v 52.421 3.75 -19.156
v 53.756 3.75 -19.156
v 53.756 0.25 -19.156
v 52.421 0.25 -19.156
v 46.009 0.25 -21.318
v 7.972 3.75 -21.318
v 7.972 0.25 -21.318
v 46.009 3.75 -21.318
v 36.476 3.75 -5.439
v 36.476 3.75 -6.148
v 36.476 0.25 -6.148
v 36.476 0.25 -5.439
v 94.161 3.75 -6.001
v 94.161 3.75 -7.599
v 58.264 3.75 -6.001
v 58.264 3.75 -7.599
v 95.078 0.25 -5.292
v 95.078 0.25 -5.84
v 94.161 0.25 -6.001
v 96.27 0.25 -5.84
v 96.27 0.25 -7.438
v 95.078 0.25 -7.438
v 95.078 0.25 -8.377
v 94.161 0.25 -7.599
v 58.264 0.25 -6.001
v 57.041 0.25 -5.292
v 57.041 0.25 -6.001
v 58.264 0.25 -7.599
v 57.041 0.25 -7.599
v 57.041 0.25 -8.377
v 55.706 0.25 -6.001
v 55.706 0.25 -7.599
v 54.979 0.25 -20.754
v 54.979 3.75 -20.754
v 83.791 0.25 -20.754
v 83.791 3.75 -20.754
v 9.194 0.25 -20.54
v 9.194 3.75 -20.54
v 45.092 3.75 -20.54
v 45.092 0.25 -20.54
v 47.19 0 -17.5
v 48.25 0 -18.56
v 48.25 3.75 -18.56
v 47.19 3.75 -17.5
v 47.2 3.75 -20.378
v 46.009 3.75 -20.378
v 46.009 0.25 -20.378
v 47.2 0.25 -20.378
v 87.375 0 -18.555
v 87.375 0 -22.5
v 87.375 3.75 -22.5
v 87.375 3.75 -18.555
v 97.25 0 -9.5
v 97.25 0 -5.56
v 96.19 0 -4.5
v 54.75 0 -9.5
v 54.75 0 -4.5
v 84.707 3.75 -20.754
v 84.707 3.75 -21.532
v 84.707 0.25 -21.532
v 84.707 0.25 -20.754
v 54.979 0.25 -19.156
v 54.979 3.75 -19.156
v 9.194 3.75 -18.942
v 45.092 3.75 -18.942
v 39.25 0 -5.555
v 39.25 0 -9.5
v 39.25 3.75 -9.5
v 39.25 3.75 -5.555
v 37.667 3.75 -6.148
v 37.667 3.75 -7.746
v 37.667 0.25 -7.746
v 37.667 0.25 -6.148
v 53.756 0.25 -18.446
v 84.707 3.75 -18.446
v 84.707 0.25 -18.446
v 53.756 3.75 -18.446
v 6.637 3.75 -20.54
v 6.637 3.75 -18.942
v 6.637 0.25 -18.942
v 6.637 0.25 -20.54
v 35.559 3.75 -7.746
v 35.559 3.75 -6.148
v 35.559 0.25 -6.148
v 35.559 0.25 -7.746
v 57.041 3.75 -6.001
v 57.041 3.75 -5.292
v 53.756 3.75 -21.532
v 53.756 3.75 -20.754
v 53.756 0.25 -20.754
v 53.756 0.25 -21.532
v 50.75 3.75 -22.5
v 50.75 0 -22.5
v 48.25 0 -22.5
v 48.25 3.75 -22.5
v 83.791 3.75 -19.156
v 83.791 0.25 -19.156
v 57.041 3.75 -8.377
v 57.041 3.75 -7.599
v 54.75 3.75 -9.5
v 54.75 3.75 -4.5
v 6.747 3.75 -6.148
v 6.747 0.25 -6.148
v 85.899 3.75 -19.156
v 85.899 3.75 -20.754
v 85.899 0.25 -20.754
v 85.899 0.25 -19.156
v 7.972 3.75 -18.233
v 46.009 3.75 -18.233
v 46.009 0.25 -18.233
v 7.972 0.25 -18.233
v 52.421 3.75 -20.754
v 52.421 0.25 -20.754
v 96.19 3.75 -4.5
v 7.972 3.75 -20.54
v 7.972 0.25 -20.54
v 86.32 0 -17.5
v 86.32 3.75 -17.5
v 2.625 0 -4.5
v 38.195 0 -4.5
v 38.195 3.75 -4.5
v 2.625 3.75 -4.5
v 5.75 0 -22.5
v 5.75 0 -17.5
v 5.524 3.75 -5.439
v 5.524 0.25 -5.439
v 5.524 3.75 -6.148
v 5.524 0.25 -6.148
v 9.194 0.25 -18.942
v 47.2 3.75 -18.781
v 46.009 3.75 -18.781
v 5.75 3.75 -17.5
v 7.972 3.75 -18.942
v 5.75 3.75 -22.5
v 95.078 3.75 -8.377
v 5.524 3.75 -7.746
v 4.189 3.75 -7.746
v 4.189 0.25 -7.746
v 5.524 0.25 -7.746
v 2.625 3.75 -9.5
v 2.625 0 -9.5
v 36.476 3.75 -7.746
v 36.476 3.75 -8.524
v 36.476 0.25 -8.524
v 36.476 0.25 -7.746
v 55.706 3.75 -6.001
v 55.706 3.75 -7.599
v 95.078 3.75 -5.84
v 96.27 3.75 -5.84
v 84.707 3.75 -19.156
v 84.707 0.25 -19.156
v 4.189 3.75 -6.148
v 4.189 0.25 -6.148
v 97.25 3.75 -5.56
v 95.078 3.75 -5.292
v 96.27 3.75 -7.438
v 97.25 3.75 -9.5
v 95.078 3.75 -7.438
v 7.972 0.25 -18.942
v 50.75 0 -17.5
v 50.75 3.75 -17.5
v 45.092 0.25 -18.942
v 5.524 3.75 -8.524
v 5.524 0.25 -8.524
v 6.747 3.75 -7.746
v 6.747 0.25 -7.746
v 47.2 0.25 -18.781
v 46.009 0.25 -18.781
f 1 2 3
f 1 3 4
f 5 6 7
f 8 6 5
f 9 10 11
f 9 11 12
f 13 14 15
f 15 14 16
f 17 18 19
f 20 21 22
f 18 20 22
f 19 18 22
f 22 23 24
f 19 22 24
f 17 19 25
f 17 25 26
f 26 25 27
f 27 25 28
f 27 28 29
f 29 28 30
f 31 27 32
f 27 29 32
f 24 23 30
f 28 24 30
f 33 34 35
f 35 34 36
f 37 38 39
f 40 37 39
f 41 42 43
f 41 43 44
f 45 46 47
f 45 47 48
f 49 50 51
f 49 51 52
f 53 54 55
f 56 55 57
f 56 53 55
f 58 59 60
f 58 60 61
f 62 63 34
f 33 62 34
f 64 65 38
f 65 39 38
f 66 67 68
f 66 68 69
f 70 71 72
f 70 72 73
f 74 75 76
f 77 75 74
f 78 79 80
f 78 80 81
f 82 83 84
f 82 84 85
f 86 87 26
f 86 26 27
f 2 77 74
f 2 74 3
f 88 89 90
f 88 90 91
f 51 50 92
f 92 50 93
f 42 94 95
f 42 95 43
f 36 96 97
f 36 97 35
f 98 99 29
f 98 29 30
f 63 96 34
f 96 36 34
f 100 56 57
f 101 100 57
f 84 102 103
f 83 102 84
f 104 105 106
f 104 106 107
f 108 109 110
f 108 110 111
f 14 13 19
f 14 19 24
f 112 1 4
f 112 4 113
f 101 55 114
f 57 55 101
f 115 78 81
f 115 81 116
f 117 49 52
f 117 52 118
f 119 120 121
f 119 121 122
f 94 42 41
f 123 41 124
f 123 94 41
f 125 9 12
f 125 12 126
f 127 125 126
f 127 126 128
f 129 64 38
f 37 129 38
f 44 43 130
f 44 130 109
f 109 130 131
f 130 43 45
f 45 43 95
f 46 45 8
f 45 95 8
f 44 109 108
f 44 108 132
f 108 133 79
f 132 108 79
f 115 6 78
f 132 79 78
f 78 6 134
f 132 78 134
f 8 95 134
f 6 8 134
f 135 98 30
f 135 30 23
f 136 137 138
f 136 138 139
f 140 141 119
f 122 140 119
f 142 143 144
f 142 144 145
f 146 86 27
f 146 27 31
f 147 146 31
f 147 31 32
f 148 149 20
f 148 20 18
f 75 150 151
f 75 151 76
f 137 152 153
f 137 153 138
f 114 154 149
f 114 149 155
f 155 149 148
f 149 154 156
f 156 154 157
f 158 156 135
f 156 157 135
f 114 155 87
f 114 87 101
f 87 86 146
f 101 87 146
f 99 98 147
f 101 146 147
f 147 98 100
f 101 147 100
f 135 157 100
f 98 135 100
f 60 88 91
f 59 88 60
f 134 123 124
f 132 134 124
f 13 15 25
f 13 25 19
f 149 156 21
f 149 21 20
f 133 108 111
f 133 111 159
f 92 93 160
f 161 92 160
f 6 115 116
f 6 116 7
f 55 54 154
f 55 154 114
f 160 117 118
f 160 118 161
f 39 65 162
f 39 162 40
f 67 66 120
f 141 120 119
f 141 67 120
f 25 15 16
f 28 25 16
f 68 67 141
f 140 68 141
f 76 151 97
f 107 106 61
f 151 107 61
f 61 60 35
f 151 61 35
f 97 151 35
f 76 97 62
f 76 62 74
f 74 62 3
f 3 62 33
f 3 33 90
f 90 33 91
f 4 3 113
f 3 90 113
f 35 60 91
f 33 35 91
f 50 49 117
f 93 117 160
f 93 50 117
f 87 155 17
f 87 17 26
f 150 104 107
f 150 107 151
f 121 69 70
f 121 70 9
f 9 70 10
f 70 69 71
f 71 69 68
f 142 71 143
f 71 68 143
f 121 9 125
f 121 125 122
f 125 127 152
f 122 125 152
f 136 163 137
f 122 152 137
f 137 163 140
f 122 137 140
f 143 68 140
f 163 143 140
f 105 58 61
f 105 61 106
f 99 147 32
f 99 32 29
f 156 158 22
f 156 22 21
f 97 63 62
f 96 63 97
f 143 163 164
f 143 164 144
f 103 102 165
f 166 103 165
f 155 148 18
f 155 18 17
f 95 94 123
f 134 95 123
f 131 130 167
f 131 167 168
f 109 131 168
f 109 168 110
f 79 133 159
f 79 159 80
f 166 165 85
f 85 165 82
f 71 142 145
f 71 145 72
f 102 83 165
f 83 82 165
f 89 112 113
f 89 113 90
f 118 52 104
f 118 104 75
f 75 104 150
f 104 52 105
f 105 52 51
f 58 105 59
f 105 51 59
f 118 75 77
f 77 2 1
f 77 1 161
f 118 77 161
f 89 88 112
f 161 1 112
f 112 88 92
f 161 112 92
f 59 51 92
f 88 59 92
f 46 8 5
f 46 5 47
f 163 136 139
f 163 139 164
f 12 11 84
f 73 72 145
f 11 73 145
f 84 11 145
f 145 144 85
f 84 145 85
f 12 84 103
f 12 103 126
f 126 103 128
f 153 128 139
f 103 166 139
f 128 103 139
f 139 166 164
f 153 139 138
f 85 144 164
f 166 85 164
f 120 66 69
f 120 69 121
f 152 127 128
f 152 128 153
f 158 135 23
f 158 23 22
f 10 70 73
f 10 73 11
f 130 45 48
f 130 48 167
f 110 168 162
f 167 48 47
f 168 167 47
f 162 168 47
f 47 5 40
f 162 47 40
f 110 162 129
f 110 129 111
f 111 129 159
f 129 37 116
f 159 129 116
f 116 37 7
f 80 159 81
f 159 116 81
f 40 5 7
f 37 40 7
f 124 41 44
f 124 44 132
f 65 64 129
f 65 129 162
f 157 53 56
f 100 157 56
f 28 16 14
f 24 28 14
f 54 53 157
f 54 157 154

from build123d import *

# Parameters (mm, degrees)
SV_DEPTH           = 3.75
SV_2_DEPTH         = 3.75
SV_3_DEPTH         = 3.75
SV_4_DEPTH         = 3.75
SKETCH3_W          = 28.811718275
SKETCH3_H          = 1.597828601
SKETCH3_W_2        = 35.897762959
SKETCH3_W_3        = 35.897762958
CUT_EXTRUDE1_DEPTH = 3.5


with BuildPart() as part:
    # Sketch1 → SV (new body)
    with BuildSketch(Plane(origin=(0, 0, 0), x_dir=(1, 0, 0), z_dir=(0, 1, 0))):
        Polygon((55.811, 9.5), (97.25, 9.5), (97.25, 5.56), (96.19, 4.5), (54.75, 4.5), (54.75, 8.439), (54.75, 9.5), align=None)
    extrude(amount=SV_DEPTH)


with BuildPart() as body_2:
    # Sketch1 → SV 2 (new body)
    with BuildSketch(Plane(origin=(0, 0, 0), x_dir=(1, 0, 0), z_dir=(0, 1, 0))):
        Polygon((3.686, 9.5), (39.25, 9.5), (39.25, 5.555), (38.195, 4.5), (2.625, 4.5), (2.625, 8.439), (2.625, 9.5), align=None)
    extrude(amount=SV_2_DEPTH)


with BuildPart() as body_3:
    # Sketch1 → SV 3 (new body)
    with BuildSketch(Plane(origin=(0, 0, 0), x_dir=(1, 0, 0), z_dir=(0, 1, 0))):
        Polygon((51.811, 22.5), (87.375, 22.5), (87.375, 18.555), (86.32, 17.5), (50.75, 17.5), (50.75, 21.439), (50.75, 22.5), align=None)
    extrude(amount=SV_3_DEPTH)


with BuildPart() as body_4:
    # Sketch1 → SV 4 (new body)
    with BuildSketch(Plane(origin=(0, 0, 0), x_dir=(1, 0, 0), z_dir=(0, 1, 0))):
        Polygon((6.811, 22.5), (48.25, 22.5), (48.25, 18.56), (47.19, 17.5), (5.75, 17.5), (5.75, 21.439), (5.75, 22.5), align=None)
    extrude(amount=SV_4_DEPTH)


with BuildPart() as cut_extrude1_tool:
    # Sketch3 → Cut-Extrude1 (new body)
    with BuildSketch(Plane(origin=(0, 3.75, 0), x_dir=(1, 0, 0), z_dir=(0, 1, 0))):
        Polygon((4.189336253, 7.745735487), (5.524337048, 7.745735487), (5.524337048, 8.524173538), (36.475691419, 8.524173538), (36.475691419, 7.745735487), (37.666991912, 7.745735487), (37.666991912, 6.147906886), (36.475691419, 6.147906886), (36.475691419, 5.438560322), (5.524337048, 5.438560322), (5.524337048, 6.147906886), (4.189336253, 6.147906886), align=None)
        with Locations((21.152985591, 6.946821187)):
            Rectangle(SKETCH3_W, SKETCH3_H, mode=Mode.SUBTRACT)
        Polygon((52.421116037, 20.753597434), (53.756116831, 20.753597434), (53.756116831, 21.532035485), (84.707471203, 21.532035485), (84.707471203, 20.753597434), (85.898771695, 20.753597434), (85.898771695, 19.155768833), (84.707471203, 19.155768833), (84.707471203, 18.446422269), (53.756116831, 18.446422269), (53.756116831, 19.155768833), (52.421116037, 19.155768833), align=None)
        with Locations((69.384765375, 19.954683133)):
            Rectangle(SKETCH3_W, SKETCH3_H, mode=Mode.SUBTRACT)
        Polygon((55.705906871, 7.599031898), (57.040907666, 7.599031898), (57.040907666, 8.377469948), (95.07830672, 8.377469948), (95.07830672, 7.437727621), (96.269607213, 7.437727621), (96.269607213, 5.83989902), (95.07830672, 5.83989902), (95.07830672, 5.291856733), (57.040907666, 5.291856733), (57.040907666, 6.001203297), (55.705906871, 6.001203297), align=None)
        with Locations((76.21257855, 6.800117597)):
            Rectangle(SKETCH3_W_2, SKETCH3_H, mode=Mode.SUBTRACT)
        Polygon((6.636601859, 20.53972103), (7.971602653, 20.53972103), (7.971602653, 21.318159081), (46.009001708, 21.318159081), (46.009001708, 20.378416754), (47.2003022, 20.378416754), (47.2003022, 18.780588153), (46.009001708, 18.780588153), (46.009001708, 18.232545866), (7.971602653, 18.232545866), (7.971602653, 18.941892429), (6.636601859, 18.941892429), align=None)
        with Locations((27.143273538, 19.74080673)):
            Rectangle(SKETCH3_W_3, SKETCH3_H, mode=Mode.SUBTRACT)
    extrude(amount=-CUT_EXTRUDE1_DEPTH)


with BuildPart() as part_1:
    add(part.part)

    # Cut-Extrude1: cut by cut_extrude1_tool
    add(cut_extrude1_tool.part, mode=Mode.SUBTRACT)


with BuildPart() as body_2_1:
    add(body_2.part)

    # Cut-Extrude1: cut by cut_extrude1_tool
    add(cut_extrude1_tool.part, mode=Mode.SUBTRACT)


with BuildPart() as body_3_1:
    add(body_3.part)

    # Cut-Extrude1: cut by cut_extrude1_tool
    add(cut_extrude1_tool.part, mode=Mode.SUBTRACT)


with BuildPart() as body_4_1:
    add(body_4.part)

    # Cut-Extrude1: cut by cut_extrude1_tool
    add(cut_extrude1_tool.part, mode=Mode.SUBTRACT)


solid = Compound([part_1.part, body_2_1.part, body_3_1.part, body_4_1.part])
